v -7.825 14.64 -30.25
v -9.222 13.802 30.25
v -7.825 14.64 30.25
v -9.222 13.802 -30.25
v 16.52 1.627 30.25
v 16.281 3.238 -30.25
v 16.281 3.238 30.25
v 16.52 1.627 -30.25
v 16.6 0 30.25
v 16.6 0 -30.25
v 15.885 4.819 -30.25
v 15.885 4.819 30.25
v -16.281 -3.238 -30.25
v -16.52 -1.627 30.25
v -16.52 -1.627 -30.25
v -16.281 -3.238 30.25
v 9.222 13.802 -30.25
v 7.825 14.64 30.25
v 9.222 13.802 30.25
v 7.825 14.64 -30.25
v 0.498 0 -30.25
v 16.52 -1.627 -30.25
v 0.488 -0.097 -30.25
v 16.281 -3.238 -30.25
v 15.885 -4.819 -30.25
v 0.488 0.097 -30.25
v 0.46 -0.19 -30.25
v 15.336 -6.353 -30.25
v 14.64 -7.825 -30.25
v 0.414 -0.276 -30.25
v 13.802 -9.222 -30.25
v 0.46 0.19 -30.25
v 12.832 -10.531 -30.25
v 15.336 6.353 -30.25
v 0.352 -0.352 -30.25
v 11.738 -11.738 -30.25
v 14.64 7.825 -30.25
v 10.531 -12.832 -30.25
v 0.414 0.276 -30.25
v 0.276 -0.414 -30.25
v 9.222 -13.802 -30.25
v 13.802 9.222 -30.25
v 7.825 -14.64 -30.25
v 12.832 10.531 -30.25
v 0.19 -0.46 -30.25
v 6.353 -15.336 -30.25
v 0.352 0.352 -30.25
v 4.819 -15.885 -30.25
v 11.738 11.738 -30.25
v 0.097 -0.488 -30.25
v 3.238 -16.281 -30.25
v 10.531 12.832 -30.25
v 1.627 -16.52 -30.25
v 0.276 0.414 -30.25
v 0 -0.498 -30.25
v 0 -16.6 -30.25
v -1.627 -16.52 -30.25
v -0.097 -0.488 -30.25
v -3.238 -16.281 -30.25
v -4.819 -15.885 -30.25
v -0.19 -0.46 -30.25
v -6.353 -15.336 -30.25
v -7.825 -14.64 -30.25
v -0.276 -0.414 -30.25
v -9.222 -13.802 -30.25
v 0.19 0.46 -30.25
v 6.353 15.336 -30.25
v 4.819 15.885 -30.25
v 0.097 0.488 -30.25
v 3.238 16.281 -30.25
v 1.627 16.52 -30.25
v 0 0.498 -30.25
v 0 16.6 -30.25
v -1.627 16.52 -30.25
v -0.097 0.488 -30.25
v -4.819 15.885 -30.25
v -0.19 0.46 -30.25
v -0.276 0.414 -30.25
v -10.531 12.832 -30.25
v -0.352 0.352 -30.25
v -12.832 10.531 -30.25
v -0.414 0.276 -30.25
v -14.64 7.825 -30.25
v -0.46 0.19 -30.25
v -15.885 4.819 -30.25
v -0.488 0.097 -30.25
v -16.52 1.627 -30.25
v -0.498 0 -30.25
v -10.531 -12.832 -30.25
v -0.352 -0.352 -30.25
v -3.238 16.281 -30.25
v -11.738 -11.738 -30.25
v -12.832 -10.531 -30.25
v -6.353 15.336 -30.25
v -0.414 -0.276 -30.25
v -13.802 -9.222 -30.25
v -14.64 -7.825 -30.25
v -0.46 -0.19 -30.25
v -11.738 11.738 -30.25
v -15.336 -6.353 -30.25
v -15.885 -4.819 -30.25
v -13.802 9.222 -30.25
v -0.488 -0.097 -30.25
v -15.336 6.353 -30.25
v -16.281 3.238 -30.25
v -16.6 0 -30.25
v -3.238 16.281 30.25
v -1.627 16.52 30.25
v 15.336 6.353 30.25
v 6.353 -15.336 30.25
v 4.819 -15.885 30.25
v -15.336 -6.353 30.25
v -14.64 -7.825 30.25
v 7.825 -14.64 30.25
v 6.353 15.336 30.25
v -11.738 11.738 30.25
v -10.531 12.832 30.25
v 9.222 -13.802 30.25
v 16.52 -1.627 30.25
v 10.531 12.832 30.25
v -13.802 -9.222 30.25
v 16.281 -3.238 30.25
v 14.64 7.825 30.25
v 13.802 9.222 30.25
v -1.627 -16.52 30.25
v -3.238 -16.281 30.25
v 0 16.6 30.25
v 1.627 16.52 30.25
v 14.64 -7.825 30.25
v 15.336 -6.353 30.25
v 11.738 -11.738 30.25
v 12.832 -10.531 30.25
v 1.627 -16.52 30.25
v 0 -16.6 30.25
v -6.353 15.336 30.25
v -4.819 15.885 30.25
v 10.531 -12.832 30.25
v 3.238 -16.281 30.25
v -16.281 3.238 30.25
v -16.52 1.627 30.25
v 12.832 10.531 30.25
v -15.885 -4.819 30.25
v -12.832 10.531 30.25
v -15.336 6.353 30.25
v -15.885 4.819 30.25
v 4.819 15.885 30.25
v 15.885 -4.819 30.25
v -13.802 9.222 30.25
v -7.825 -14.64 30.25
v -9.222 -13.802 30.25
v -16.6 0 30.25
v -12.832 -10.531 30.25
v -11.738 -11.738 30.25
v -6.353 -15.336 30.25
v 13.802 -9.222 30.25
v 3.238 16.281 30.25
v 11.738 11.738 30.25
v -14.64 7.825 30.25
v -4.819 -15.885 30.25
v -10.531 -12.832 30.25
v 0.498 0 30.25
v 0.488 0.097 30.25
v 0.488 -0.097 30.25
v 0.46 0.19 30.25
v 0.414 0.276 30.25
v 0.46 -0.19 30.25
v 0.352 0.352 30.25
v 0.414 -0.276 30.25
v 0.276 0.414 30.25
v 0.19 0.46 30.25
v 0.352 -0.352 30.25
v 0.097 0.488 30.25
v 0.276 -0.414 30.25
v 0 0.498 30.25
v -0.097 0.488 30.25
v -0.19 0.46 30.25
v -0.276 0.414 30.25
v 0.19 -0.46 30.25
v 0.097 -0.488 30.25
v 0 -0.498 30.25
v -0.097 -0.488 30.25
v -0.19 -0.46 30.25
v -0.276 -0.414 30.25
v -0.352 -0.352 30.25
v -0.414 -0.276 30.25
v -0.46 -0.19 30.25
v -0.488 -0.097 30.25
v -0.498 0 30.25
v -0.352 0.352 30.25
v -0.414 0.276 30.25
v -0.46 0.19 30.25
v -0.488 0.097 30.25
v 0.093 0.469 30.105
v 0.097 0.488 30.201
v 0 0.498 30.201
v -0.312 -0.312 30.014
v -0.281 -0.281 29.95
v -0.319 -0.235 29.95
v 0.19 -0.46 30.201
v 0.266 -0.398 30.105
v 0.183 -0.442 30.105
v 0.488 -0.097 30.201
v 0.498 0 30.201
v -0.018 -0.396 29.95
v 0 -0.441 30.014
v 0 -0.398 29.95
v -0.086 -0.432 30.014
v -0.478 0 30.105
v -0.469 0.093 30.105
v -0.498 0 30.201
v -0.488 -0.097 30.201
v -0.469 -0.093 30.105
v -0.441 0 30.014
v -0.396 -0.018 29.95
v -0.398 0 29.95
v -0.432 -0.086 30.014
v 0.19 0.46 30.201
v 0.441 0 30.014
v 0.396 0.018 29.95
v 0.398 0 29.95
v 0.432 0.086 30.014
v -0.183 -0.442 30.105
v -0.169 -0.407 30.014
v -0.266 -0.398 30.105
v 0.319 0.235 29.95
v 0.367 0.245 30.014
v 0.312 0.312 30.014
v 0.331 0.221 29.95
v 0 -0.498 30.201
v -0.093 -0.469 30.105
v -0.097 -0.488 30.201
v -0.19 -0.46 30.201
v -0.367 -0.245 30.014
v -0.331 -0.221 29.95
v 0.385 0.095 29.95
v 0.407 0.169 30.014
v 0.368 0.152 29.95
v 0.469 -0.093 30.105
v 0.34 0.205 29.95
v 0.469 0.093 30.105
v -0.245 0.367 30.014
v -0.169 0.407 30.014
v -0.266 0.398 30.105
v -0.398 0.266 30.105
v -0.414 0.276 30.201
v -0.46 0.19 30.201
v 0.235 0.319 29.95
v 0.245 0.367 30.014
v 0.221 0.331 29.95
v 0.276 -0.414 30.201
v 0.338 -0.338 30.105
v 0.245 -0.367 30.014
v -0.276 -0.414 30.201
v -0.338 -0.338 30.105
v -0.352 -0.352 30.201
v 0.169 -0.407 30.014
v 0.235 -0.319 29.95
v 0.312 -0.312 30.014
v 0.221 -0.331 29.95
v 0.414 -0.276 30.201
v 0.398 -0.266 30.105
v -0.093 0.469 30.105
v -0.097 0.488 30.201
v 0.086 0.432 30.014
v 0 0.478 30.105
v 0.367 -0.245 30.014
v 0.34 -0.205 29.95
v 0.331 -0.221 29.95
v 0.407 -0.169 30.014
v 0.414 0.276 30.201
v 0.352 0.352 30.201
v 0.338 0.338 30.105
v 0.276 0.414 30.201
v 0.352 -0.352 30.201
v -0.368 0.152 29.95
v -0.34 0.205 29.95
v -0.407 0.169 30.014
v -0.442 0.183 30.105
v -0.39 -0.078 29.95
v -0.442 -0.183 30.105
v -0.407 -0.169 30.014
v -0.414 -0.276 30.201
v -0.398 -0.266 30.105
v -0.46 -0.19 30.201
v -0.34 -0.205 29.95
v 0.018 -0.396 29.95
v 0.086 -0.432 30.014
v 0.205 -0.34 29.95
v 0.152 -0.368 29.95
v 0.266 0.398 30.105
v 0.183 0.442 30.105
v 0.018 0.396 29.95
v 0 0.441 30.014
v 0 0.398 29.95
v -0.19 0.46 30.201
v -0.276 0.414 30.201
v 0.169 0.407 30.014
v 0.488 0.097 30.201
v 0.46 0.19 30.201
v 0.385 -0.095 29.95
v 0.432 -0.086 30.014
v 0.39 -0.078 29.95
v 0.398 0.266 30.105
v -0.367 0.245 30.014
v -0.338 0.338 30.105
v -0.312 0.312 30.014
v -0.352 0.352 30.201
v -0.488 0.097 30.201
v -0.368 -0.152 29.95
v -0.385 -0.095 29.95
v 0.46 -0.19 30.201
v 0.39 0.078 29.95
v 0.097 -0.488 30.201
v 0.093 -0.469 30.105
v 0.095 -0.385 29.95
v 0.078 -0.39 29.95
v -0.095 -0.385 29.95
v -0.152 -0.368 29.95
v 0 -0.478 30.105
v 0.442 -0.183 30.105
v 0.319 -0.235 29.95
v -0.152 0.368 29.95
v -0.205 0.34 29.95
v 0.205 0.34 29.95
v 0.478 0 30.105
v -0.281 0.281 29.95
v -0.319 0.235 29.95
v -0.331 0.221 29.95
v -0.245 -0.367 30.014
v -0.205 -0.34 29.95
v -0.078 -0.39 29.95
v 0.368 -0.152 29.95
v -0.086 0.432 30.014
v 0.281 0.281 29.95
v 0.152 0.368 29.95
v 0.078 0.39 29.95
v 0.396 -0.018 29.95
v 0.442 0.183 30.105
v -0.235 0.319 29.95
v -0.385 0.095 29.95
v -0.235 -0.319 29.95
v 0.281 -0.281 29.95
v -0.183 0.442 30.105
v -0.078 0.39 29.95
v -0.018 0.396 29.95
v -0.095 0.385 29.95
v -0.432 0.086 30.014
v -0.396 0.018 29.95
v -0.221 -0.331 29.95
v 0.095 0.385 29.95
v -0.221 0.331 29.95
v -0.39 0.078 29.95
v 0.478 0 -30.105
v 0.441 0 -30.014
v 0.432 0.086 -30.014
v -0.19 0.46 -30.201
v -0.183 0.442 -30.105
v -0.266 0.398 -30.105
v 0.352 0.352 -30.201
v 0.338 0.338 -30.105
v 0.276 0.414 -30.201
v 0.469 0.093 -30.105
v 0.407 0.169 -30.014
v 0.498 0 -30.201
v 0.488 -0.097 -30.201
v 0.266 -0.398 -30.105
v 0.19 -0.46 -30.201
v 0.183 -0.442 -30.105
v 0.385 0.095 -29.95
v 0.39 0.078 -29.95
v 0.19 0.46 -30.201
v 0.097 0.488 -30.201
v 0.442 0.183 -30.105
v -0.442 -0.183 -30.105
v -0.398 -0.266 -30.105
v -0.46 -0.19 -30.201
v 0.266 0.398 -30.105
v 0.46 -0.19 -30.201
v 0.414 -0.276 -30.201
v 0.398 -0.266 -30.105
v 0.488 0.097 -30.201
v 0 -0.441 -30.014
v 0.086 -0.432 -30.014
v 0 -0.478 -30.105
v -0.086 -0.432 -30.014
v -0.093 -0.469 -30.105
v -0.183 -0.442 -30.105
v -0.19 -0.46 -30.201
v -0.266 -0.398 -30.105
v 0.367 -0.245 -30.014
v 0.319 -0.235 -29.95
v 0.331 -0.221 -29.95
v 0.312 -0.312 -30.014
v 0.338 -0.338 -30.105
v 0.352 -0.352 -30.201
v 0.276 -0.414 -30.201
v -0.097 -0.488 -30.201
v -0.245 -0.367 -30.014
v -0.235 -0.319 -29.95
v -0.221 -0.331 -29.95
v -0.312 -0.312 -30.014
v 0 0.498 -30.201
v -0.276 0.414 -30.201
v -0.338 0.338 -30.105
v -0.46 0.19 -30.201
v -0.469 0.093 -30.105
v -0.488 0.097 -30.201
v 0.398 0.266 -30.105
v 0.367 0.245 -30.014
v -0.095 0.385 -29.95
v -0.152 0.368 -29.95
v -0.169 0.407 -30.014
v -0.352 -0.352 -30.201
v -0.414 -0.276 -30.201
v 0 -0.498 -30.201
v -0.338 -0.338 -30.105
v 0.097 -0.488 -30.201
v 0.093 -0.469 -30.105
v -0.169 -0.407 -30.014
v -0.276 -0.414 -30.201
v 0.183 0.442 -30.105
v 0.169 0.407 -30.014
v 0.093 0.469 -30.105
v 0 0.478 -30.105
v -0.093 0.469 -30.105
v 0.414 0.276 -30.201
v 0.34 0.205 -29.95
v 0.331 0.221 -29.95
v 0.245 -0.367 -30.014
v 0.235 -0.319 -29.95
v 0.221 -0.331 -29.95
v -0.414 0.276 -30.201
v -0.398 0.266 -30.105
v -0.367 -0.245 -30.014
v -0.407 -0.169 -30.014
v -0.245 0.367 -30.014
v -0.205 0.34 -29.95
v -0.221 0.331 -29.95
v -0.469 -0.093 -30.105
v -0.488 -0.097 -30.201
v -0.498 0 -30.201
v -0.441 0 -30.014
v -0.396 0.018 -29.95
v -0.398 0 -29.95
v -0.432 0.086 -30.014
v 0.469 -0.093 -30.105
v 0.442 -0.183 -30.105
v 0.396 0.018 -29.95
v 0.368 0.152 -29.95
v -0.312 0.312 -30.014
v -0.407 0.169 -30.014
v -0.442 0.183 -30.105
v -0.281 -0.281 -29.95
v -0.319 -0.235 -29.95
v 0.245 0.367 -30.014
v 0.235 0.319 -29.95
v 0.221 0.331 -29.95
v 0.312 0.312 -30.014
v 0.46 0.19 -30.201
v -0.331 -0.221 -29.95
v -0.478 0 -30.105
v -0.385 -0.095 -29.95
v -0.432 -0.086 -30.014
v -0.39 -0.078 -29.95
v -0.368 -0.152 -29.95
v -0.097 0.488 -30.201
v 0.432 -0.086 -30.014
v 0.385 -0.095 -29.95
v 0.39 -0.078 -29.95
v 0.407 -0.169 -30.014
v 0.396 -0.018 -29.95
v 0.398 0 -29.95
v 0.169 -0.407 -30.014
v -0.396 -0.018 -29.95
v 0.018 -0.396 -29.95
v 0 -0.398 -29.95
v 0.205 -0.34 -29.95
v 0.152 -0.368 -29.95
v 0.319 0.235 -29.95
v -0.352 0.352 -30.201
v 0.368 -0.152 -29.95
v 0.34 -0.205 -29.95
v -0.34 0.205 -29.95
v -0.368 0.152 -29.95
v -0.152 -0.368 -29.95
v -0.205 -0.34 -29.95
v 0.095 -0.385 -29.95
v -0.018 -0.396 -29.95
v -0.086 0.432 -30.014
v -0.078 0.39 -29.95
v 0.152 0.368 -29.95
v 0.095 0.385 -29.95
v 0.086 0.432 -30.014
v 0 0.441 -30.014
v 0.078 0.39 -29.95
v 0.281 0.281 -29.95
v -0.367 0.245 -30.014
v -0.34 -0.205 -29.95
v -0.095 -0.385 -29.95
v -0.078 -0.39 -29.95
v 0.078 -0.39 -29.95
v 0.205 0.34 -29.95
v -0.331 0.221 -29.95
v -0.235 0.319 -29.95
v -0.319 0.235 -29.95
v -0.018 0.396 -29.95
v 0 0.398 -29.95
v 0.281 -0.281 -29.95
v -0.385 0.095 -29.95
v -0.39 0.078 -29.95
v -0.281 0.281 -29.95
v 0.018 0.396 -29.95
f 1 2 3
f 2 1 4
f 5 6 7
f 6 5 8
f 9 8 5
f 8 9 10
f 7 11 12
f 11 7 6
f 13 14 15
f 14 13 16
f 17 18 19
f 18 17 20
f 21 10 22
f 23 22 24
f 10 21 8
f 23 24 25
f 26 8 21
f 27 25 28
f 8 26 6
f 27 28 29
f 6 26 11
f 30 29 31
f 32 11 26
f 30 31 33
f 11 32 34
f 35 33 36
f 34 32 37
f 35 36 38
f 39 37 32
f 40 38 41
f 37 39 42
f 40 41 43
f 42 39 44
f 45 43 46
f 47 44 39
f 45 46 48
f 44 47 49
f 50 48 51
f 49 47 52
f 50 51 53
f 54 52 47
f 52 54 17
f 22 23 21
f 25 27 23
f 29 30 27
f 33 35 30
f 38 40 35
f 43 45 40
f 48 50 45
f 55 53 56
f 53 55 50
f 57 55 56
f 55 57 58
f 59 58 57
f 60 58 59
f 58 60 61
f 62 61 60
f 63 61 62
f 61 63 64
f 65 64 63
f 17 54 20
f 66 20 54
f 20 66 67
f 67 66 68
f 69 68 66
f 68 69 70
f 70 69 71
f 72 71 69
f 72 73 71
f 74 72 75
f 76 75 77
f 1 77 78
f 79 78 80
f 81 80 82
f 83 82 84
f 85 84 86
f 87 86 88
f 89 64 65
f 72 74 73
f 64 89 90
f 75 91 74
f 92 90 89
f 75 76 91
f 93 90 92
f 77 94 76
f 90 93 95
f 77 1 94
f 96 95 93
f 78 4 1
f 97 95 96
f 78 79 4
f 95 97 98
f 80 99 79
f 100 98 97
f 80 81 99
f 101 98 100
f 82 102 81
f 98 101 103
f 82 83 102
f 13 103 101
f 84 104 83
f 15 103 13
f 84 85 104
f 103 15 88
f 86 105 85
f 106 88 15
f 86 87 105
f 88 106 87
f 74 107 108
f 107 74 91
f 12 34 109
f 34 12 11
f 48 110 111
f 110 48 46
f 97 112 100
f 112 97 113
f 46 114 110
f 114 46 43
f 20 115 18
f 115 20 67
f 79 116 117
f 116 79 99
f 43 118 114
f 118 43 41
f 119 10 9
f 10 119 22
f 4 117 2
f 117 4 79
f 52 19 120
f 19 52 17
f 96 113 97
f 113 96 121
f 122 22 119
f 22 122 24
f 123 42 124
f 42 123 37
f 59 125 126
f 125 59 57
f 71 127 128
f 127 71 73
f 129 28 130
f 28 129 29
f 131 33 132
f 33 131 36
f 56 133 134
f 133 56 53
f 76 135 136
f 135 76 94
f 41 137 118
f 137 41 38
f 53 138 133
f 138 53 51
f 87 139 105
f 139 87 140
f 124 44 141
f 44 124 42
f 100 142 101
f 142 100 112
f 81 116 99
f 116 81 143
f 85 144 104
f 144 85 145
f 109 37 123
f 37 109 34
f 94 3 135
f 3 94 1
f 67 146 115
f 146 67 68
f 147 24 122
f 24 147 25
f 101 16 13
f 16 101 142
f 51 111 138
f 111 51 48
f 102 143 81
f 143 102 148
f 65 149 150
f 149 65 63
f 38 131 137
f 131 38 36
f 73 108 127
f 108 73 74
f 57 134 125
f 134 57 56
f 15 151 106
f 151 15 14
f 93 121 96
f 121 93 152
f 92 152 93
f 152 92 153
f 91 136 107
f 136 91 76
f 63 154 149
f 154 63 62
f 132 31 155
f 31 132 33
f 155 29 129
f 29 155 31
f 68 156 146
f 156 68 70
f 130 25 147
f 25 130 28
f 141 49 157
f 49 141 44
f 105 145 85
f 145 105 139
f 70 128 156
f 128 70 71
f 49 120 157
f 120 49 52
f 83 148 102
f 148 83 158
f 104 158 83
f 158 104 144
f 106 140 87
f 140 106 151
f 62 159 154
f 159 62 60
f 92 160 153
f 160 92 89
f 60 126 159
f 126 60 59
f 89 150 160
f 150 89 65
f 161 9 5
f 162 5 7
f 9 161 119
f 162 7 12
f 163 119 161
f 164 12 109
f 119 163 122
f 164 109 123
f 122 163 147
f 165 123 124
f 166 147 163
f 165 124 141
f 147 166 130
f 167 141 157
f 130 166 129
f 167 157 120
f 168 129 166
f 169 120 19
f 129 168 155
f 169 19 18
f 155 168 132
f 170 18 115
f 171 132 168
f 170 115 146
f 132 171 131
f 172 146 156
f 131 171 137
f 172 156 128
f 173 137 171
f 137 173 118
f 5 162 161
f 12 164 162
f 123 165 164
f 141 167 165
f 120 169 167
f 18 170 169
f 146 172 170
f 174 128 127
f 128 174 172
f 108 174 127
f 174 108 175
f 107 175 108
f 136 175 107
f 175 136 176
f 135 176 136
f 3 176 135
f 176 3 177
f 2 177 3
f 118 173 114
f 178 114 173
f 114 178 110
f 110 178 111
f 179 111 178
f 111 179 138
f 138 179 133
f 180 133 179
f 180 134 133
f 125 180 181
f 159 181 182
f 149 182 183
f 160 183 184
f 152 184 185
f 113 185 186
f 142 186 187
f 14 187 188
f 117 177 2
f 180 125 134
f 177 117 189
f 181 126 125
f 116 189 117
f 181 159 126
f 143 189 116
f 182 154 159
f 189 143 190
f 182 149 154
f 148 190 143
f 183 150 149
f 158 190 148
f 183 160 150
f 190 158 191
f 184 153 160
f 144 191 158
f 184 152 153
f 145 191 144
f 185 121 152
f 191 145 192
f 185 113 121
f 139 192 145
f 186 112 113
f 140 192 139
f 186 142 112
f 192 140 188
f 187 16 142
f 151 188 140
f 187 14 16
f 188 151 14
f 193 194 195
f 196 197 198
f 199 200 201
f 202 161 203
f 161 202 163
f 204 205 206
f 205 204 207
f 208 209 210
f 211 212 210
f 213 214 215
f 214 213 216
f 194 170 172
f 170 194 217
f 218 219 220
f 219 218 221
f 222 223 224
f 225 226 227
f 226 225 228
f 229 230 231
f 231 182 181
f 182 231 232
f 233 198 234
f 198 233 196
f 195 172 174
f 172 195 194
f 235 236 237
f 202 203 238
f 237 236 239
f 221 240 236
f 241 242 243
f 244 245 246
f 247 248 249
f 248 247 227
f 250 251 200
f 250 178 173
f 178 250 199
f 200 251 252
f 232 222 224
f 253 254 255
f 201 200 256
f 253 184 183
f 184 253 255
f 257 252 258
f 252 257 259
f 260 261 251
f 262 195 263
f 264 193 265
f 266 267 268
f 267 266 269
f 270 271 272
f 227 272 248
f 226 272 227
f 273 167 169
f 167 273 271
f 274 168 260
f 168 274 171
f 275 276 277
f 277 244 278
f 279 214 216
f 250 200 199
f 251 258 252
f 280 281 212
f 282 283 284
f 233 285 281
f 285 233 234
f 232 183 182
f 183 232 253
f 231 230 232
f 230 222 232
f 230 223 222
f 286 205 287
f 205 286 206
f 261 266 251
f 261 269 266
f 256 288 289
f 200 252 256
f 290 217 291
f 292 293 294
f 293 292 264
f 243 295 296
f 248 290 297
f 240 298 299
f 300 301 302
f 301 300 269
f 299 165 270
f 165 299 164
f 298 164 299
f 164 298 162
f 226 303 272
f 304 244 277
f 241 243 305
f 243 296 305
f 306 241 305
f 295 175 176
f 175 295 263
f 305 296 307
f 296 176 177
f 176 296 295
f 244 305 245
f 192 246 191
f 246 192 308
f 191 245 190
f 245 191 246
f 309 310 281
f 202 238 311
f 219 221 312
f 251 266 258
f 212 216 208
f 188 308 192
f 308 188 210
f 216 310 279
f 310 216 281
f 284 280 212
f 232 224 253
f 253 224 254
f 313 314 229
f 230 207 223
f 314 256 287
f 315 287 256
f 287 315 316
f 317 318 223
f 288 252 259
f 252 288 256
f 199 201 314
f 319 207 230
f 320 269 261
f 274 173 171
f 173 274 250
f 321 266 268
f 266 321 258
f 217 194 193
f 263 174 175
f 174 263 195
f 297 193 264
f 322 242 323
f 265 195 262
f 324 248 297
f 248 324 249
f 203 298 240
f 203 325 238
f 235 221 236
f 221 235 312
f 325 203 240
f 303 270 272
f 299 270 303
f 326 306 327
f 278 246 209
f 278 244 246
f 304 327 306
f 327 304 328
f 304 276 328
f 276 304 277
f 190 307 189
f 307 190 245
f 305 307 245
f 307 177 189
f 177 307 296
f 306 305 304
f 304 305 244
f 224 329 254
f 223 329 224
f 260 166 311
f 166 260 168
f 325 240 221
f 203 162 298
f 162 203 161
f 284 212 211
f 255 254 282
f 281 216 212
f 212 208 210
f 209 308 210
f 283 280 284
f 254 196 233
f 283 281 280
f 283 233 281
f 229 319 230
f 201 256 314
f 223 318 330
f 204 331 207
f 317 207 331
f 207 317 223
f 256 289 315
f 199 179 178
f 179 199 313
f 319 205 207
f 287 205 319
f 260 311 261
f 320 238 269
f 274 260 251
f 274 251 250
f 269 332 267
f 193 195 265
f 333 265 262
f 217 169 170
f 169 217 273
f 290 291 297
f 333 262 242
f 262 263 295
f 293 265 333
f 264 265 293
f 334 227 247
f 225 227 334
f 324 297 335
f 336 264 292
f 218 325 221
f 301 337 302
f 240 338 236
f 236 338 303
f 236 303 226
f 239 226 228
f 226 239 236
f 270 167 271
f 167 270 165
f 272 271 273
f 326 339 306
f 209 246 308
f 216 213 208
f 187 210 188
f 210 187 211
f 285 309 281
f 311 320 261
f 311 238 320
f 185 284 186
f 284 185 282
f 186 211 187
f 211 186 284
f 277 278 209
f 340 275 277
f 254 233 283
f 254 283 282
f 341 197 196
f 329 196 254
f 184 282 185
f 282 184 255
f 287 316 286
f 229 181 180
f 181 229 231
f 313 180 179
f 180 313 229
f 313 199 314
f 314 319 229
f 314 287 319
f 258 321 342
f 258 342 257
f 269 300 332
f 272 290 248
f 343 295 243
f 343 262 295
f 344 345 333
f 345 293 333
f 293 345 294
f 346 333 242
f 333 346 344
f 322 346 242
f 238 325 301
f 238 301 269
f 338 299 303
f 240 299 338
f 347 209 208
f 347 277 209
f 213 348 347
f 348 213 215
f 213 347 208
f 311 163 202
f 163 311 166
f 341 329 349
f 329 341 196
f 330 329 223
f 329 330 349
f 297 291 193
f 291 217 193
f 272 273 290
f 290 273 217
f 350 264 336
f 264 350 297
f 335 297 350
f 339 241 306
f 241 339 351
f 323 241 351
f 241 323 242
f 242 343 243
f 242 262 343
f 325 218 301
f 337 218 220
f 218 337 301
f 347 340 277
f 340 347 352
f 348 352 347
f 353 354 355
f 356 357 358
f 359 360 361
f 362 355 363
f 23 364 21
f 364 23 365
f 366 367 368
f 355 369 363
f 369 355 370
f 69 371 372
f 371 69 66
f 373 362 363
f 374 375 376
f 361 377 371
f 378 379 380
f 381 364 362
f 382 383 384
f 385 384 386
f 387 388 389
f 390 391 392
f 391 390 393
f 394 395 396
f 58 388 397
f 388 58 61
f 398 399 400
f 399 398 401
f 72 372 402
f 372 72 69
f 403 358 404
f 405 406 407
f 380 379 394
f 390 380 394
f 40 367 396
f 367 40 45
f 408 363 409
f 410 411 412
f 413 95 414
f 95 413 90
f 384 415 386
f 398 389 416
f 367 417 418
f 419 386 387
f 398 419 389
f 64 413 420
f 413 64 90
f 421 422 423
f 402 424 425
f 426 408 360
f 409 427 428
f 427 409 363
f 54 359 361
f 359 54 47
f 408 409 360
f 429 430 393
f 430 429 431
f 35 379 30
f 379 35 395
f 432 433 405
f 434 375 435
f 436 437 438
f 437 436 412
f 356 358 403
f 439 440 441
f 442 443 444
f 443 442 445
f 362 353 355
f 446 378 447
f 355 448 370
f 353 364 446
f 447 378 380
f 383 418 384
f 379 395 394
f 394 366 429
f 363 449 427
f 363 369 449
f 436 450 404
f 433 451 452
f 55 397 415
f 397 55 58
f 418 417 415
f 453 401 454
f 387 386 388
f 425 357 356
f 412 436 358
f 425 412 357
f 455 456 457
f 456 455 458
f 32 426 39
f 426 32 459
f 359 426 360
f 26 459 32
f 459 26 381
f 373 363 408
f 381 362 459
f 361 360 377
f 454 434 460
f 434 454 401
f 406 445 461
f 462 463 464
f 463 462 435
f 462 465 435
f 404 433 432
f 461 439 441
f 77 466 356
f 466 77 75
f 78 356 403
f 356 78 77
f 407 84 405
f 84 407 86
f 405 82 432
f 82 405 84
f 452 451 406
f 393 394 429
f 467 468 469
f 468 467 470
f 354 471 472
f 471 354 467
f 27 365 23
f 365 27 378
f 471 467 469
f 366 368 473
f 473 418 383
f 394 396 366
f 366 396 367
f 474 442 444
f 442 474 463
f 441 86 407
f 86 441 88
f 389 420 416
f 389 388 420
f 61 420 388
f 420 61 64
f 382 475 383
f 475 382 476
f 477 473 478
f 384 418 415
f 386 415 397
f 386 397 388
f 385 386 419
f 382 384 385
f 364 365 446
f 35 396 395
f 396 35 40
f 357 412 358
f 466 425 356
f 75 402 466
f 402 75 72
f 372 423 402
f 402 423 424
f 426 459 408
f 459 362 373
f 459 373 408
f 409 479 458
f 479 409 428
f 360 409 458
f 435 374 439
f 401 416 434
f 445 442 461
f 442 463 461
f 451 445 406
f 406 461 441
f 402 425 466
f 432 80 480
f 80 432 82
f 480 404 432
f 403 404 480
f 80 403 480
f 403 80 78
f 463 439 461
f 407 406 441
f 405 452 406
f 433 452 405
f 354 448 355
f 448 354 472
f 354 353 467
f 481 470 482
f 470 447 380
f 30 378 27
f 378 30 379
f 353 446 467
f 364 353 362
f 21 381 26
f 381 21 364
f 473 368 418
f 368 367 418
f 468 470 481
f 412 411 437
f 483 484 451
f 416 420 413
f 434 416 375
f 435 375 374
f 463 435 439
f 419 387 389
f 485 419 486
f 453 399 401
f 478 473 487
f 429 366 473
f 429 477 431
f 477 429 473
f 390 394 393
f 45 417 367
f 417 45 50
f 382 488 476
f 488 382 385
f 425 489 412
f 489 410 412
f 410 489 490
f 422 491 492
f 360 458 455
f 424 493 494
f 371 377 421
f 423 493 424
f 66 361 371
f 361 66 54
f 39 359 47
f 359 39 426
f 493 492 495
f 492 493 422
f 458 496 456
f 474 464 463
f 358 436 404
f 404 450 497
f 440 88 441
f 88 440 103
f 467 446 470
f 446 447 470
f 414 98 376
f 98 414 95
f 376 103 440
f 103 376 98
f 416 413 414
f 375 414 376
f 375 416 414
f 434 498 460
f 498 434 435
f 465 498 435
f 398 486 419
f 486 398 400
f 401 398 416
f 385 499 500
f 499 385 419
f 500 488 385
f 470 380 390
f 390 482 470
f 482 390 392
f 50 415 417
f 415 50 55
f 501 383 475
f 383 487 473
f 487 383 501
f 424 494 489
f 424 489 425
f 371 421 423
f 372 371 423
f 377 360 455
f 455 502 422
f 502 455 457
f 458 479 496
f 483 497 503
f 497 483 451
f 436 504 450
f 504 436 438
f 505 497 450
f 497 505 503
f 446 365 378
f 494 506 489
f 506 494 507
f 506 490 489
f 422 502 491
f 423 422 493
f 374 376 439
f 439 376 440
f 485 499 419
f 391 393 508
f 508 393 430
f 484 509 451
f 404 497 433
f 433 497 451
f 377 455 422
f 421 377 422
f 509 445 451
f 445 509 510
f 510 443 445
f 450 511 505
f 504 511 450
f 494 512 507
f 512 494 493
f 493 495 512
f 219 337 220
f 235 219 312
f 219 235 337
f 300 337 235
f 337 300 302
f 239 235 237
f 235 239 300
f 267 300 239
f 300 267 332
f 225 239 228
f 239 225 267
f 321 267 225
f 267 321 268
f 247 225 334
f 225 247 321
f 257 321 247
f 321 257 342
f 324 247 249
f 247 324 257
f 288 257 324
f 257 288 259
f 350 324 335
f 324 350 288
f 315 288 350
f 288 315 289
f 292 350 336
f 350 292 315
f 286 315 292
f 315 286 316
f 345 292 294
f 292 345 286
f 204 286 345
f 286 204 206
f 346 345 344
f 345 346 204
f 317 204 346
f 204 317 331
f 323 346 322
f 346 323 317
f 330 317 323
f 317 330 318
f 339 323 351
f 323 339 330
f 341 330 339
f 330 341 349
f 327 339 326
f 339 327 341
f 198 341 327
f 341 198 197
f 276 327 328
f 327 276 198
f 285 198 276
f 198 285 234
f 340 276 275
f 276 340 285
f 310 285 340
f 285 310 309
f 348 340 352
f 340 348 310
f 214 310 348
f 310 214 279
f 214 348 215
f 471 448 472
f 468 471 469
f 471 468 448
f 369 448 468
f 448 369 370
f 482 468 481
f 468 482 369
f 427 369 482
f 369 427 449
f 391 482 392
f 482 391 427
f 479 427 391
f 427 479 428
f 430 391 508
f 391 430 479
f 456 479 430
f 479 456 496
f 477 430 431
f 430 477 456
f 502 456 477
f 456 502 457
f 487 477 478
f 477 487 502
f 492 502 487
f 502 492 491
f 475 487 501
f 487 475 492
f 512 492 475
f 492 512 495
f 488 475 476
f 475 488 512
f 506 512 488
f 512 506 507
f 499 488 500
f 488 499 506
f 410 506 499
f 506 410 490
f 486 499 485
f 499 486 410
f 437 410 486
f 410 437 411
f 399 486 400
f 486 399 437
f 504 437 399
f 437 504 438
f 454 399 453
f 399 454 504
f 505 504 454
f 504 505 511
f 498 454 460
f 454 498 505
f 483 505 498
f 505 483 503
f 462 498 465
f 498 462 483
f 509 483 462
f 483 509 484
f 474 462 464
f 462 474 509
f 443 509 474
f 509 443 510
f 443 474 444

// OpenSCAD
// Parameters
height_mm = 61.5; //[30.75:123:0.1]
diameter_mm = 34.2; //[17.1:68.4:0.1]
positive_terminal_diameter_mm = 10; //[5:20:0.1]
positive_terminal_height_mm = 1.5; //[0.75:3:0.1]
negative_terminal_diameter_mm = 12; //[6:24:0.1]
negative_terminal_height_mm = 0.5; //[0.25:1:0.05]
edge_fillet_radius_mm = 0.5; //[0.25:1:0.05]
connect_overlap_mm = 0.8; //[0.5:2:0.1]

// Battery Cell Body with Fillet
module battery_cell_body() {
  color("DimGray") {
    difference() {
      // Main cylindrical body
      cylinder(h=height_mm - 2*edge_fillet_radius_mm, r=diameter_mm/2 - edge_fillet_radius_mm, center=true, $fn=64);
      // Fillet effect using offset
      translate([0, 0, height_mm/2 - edge_fillet_radius_mm])
        sphere(r=edge_fillet_radius_mm, $fn=32);
      translate([0, 0, -height_mm/2 + edge_fillet_radius_mm])
        sphere(r=edge_fillet_radius_mm, $fn=32);
    }
  }
}

// Positive Terminal Cap
module positive_terminal_cap() {
  color("Silver") {
    translate([0, 0, height_mm/2 - positive_terminal_height_mm/2 - connect_overlap_mm])
      cylinder(h=positive_terminal_height_mm, r=positive_terminal_diameter_mm/2, center=true, $fn=32);
  }
}

// Negative Terminal Contact
module negative_terminal_contact() {
  color("Silver") {
    translate([0, 0, -height_mm/2 + negative_terminal_height_mm/2 + connect_overlap_mm])
      cylinder(h=negative_terminal_height_mm, r=negative_terminal_diameter_mm/2, center=true, $fn=32);
  }
}

// Complete Battery Assembly
module battery() {
  union() {
    battery_cell_body();
    positive_terminal_cap();
    negative_terminal_contact();
  }
}

// Final Assembly
module assembly() {
  battery();
}

assembly();
